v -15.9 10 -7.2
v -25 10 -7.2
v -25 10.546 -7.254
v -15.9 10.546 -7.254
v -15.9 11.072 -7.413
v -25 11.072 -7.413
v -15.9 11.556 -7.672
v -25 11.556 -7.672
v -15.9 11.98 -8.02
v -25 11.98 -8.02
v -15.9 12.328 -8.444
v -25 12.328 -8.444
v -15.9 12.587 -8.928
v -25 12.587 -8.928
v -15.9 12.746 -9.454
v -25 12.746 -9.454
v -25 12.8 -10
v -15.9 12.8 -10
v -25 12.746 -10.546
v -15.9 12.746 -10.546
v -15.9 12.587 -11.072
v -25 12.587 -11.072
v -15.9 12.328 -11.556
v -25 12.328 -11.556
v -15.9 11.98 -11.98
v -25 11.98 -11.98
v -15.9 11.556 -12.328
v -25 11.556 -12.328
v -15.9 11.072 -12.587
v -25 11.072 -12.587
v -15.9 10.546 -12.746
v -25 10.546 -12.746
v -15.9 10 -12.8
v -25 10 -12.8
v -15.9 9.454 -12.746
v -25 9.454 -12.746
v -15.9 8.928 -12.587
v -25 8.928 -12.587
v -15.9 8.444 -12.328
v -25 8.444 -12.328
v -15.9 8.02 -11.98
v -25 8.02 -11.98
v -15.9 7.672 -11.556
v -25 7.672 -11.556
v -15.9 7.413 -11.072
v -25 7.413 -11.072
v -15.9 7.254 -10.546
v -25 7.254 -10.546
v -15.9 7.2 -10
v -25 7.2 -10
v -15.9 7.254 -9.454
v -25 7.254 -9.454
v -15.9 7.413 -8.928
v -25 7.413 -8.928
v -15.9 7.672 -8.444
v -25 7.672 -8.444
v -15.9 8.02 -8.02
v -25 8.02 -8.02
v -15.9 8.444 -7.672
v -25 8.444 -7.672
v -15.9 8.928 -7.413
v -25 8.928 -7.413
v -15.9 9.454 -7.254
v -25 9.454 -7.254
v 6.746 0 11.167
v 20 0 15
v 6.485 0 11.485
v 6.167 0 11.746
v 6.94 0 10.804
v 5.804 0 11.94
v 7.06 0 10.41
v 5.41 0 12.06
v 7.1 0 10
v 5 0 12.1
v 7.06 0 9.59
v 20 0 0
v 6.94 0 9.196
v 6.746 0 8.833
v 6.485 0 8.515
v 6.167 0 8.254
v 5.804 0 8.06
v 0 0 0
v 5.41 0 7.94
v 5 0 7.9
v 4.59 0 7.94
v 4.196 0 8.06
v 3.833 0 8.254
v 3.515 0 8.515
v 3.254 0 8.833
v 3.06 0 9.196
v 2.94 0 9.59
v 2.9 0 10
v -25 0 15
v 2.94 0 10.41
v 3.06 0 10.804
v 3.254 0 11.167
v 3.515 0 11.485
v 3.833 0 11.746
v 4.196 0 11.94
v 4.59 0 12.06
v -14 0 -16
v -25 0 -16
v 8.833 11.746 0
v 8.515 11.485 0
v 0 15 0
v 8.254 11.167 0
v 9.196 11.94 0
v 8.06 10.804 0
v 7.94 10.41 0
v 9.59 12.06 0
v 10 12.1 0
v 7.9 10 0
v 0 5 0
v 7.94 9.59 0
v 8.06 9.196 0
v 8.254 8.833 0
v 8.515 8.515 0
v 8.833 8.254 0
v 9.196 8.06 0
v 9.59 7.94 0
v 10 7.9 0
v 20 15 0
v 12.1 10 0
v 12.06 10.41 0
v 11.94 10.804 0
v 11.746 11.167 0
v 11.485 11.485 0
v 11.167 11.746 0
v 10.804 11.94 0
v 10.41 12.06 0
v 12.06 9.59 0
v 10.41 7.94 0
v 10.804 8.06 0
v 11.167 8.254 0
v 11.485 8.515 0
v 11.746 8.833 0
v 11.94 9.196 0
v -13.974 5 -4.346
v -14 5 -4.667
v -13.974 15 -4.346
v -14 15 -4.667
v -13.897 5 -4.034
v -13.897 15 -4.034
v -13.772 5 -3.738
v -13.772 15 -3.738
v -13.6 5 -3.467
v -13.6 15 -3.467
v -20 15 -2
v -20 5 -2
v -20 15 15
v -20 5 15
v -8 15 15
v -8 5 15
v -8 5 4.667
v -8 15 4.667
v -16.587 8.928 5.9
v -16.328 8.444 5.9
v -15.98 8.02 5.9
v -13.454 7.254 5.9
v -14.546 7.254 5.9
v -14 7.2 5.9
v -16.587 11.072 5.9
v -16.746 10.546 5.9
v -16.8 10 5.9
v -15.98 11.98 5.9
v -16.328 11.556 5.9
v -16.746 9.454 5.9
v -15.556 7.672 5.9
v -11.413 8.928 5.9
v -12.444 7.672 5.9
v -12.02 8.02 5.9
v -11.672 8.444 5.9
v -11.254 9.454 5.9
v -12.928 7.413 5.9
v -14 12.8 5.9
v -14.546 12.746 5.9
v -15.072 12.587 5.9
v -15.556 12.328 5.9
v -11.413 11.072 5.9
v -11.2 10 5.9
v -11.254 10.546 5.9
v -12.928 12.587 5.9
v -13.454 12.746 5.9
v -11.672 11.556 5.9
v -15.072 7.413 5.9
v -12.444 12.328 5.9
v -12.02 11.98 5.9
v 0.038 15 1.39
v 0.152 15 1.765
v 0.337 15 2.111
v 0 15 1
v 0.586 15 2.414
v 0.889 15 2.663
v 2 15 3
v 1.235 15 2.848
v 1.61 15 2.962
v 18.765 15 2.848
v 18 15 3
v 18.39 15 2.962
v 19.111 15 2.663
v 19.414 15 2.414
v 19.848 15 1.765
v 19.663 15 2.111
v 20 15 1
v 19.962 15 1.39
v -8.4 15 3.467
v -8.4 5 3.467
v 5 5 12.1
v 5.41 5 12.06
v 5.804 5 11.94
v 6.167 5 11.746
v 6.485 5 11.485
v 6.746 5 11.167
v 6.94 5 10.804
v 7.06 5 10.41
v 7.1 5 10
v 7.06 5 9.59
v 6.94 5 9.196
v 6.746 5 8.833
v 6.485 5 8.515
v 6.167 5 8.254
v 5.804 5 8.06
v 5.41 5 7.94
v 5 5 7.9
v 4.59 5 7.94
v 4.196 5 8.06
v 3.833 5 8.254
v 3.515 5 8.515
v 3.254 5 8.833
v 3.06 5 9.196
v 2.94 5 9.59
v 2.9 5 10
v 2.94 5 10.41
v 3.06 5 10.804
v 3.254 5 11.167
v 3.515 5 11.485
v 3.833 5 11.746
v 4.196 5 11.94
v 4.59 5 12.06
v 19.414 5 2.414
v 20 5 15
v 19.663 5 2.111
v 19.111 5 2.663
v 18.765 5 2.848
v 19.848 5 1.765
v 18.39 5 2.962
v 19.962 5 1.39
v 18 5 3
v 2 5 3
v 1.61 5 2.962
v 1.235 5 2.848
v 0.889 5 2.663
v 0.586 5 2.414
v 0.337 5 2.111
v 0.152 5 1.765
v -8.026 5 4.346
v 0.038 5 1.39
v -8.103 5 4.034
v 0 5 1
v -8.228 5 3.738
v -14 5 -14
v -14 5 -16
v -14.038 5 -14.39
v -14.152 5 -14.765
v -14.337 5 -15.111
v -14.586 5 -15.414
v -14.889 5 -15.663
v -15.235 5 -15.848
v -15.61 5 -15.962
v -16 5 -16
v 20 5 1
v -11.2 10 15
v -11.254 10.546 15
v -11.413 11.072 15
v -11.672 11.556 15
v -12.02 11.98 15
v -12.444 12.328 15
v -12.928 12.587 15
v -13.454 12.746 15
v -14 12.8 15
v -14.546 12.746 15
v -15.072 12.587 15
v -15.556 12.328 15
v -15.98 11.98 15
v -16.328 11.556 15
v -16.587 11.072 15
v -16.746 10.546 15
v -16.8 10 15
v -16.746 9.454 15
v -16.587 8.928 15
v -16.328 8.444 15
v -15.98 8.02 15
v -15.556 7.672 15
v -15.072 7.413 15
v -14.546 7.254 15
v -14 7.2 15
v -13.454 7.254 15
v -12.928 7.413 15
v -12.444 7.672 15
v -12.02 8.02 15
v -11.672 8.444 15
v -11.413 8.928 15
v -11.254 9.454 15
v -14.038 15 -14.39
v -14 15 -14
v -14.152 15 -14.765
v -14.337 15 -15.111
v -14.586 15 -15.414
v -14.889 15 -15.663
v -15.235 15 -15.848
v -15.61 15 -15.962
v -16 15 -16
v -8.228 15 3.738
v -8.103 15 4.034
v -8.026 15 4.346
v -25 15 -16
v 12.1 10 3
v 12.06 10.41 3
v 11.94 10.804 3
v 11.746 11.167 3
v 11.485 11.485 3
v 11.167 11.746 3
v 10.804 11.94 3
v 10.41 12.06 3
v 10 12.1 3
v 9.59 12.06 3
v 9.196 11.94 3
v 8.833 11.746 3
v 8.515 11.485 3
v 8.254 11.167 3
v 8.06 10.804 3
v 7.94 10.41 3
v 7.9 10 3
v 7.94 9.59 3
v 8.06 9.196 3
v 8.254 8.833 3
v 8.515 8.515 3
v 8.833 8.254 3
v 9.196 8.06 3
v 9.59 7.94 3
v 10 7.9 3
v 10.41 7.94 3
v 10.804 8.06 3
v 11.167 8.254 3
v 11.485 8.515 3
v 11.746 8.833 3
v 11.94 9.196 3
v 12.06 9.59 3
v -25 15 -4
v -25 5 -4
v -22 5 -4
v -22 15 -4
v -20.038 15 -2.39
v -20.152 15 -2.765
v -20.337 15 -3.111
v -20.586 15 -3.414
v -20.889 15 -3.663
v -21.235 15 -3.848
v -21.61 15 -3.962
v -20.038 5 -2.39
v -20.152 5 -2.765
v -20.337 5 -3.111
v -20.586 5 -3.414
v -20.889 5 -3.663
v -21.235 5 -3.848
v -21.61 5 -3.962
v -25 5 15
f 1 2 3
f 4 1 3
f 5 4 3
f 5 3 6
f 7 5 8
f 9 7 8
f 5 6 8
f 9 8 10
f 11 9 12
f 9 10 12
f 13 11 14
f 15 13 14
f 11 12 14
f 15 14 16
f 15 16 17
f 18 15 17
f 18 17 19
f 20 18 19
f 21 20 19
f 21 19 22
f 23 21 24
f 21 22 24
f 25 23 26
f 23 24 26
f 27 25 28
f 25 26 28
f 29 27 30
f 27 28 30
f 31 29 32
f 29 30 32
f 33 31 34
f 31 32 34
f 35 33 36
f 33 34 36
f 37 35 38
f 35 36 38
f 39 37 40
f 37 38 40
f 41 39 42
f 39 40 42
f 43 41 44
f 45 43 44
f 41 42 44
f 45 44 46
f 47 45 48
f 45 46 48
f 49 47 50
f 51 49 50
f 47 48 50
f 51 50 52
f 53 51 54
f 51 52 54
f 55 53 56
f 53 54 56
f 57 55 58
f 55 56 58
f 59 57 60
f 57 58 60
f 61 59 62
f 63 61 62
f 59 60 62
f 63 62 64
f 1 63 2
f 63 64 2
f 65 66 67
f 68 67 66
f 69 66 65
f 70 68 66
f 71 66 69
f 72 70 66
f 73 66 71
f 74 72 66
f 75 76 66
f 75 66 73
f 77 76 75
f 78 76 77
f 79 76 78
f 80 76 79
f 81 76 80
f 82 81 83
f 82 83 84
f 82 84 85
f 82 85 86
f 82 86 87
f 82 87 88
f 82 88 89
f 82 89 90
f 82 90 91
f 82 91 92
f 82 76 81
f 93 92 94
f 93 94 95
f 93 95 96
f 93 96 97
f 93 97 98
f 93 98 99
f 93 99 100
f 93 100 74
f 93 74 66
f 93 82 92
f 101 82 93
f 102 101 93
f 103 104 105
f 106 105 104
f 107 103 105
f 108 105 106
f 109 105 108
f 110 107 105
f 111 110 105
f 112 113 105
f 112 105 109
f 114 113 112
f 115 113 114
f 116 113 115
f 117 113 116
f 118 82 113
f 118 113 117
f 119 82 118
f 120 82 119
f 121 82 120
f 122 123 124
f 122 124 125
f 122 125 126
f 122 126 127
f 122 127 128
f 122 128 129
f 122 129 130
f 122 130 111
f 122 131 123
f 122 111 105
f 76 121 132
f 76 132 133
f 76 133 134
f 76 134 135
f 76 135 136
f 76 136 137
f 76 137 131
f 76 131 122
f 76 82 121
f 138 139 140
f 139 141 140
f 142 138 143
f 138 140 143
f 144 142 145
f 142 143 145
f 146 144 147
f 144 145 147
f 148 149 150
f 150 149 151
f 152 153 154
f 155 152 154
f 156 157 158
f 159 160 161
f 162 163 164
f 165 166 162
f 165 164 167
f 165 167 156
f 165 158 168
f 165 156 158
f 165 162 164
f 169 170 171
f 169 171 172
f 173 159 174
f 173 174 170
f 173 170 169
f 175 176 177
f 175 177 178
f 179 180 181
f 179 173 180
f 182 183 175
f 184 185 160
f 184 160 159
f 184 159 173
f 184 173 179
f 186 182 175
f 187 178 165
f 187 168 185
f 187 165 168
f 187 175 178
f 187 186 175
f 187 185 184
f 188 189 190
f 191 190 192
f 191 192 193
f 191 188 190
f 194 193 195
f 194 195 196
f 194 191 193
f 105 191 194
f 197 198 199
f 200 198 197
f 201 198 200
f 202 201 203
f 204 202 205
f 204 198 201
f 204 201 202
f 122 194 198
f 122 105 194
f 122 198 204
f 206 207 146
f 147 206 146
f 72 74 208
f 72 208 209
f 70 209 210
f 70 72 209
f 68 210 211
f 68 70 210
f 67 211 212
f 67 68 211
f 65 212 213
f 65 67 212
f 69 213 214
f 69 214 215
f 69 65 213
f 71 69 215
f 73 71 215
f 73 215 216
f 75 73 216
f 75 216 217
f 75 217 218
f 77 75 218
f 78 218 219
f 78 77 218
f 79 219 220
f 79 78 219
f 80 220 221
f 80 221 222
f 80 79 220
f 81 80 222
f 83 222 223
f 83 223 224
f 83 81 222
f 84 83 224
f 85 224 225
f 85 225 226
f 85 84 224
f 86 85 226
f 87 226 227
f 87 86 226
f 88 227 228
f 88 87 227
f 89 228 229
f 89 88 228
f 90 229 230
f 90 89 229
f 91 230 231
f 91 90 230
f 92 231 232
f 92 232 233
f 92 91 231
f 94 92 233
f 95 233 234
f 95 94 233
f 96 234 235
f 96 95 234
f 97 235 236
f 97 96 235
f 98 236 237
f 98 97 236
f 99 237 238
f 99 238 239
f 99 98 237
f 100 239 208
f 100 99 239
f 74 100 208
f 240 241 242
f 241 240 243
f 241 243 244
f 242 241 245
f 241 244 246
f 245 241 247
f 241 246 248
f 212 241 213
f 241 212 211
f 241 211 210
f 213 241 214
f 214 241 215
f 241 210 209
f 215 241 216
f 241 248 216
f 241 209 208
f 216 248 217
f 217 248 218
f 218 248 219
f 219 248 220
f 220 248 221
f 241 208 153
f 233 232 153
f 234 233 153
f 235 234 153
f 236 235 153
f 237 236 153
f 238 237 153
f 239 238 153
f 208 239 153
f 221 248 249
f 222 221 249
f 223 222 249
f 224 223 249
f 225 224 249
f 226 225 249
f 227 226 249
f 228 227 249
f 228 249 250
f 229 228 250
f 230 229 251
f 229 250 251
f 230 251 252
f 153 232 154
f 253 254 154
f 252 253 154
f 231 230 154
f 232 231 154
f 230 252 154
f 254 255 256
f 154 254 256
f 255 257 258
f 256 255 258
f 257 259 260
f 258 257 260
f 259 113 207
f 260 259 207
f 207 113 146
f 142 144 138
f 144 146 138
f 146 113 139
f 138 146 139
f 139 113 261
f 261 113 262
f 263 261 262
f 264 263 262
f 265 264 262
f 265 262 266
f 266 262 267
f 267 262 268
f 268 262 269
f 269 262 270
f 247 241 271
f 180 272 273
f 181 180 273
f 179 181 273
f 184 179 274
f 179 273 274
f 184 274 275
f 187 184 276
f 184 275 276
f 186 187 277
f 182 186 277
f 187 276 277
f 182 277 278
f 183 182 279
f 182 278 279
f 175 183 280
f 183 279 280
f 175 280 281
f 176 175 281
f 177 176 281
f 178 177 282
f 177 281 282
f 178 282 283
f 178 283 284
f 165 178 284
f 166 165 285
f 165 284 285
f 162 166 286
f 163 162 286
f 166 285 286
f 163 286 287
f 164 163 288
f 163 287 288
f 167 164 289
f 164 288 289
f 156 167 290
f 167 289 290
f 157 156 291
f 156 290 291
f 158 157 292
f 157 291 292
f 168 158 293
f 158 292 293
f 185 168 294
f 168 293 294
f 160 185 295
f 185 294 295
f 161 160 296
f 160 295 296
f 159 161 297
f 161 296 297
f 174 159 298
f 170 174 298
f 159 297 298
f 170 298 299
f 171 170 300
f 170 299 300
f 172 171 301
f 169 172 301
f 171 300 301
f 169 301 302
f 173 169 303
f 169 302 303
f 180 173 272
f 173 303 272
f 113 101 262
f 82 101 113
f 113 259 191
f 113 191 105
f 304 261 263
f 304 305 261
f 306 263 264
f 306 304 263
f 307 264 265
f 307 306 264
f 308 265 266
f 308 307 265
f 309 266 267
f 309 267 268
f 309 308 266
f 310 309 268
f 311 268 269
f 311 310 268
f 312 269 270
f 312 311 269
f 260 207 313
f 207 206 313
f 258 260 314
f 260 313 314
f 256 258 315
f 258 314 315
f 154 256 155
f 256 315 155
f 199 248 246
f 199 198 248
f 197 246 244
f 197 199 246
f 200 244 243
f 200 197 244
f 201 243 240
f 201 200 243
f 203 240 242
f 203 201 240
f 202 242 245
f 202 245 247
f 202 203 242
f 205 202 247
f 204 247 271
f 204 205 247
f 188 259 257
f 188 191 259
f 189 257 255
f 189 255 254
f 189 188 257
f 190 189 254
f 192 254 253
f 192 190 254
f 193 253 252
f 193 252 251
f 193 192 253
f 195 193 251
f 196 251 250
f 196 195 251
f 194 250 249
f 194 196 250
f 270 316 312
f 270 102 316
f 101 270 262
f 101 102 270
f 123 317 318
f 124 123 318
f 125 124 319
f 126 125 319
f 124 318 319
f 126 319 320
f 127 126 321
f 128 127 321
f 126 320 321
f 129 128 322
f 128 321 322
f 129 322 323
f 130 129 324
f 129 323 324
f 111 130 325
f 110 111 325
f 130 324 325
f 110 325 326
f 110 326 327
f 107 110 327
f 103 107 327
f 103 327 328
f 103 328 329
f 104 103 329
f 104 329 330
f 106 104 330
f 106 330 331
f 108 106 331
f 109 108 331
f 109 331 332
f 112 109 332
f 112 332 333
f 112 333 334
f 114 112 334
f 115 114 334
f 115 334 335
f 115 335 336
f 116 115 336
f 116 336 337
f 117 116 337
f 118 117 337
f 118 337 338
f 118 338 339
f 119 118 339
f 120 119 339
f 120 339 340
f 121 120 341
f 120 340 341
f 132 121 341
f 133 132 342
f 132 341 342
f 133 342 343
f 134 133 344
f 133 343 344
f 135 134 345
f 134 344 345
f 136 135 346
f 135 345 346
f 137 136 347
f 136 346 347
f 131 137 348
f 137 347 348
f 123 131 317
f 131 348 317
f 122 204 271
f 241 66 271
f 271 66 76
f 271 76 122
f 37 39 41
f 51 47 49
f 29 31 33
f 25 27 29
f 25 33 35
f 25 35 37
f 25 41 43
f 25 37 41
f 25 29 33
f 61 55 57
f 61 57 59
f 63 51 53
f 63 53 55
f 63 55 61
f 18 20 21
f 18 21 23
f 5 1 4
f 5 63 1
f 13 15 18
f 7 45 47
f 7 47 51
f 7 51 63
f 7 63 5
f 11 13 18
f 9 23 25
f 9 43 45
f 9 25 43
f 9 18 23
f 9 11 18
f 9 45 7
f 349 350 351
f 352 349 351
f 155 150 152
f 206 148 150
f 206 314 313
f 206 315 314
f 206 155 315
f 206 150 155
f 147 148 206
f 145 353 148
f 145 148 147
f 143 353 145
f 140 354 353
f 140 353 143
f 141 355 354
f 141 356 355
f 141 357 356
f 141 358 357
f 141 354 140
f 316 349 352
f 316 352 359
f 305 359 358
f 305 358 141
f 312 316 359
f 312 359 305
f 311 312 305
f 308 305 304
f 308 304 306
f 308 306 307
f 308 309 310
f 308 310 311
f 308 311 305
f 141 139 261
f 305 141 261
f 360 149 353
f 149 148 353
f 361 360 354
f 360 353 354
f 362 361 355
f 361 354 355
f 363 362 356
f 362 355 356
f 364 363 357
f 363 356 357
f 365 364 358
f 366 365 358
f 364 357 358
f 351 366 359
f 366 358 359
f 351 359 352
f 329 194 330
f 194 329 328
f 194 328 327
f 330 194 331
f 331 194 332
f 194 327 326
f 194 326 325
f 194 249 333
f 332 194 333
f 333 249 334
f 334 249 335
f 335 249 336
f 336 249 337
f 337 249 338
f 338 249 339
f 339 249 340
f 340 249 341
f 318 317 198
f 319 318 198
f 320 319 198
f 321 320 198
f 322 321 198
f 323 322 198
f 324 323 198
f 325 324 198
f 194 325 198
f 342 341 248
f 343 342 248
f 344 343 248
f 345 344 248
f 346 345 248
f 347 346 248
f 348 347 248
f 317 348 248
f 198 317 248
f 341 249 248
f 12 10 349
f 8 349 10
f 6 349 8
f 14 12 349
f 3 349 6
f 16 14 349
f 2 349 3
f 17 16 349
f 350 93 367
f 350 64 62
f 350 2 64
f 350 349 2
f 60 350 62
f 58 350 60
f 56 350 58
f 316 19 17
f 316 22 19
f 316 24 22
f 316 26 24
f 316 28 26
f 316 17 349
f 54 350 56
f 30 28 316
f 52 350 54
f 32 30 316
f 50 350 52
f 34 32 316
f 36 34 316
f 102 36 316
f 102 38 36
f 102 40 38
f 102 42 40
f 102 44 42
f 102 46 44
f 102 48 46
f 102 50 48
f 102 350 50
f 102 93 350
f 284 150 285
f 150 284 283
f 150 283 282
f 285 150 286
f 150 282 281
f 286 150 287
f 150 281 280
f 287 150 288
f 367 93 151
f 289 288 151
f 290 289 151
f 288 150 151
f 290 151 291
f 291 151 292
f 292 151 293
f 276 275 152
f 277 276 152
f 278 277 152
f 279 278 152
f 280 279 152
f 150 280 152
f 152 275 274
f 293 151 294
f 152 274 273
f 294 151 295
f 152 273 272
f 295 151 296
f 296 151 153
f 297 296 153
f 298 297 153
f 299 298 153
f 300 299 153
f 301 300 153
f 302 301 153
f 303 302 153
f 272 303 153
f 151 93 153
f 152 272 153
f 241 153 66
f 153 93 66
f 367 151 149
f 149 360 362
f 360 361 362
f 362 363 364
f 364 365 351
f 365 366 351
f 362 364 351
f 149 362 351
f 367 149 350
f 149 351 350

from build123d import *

# Parameters (mm, degrees)
ESQUISSE1_R             = 2.1
BOSS_EXTRU_1_DEPTH      = 5
ESQUISSE2_W             = 20
ESQUISSE2_H             = 3
BOSS_EXTRU_2_DEPTH      = 10
ESQUISSE3_R             = 2.8
ENL_V_MAT_EXTRU_1_DEPTH = 9.1
ESQUISSE4_R             = 2.1
ENL_V_MAT_EXTRU_2_DEPTH = 9.1
CONG_2_R                = 2
ESQUISSE5_R             = 2.8
ENL_V_MAT_EXTRU_3_DEPTH = 9.1


with BuildPart() as part:
    # Esquisse1 → Boss.-Extru.1 (new body)
    with BuildSketch(Plane(origin=(0, 0, 0), x_dir=(1, 0, 0), z_dir=(0, 1, 0))):
        Polygon((20, 0), (20, -15), (-20, -15), (-25, -15), (-25, 16), (-14, 16), (0, 0), align=None)
        with Locations(Location((5, -10, 0), (0, 0, 270))):
            Circle(ESQUISSE1_R, mode=Mode.SUBTRACT)
    extrude(amount=BOSS_EXTRU_1_DEPTH)

    # Esquisse2 → Boss.-Extru.2 (add)
    with BuildSketch(Plane(origin=(0, 5, 0), x_dir=(1, 0, 0), z_dir=(0, 1, 0))):
        with Locations((10, -1.5)):
            Rectangle(ESQUISSE2_W, ESQUISSE2_H)
        Polygon((-14, 4), (-14, 16), (-25, 16), (-25, 4), (-20, 4), (-20, -15), (-8, -15), (-8, -4), align=None)
    extrude(amount=BOSS_EXTRU_2_DEPTH)

    # Esquisse3 → Enlèv. mat.-Extru.1 (cut)
    with BuildSketch(Plane.XY.offset(15)):
        with Locations((-14, 10)):
            Circle(ESQUISSE3_R)
    extrude(amount=-ENL_V_MAT_EXTRU_1_DEPTH, mode=Mode.SUBTRACT)

    # Esquisse4 → Enlèv. mat.-Extru.2 (cut)
    with BuildSketch(Plane.XY.offset(3)):
        with Locations((10, 10)):
            Circle(ESQUISSE4_R)
    extrude(amount=-ENL_V_MAT_EXTRU_2_DEPTH, mode=Mode.SUBTRACT)

    # Congé2
    cong_2_edges = [part.edges().sort_by_distance(p)[0] for p in [
        (0, 10, 3),
        (20, 10, 3),
        (-20, 10, -4),
        (-8, 10, 4),
        (-14, 10, -4),
        (-14, 10, -16),
    ]]
    fillet(cong_2_edges, radius=CONG_2_R)

    # Esquisse5 → Enlèv. mat.-Extru.3 (cut)
    with BuildSketch(Plane.ZY.offset(25)):
        with Locations((-10, 10)):
            Circle(ESQUISSE5_R)
    extrude(amount=-ENL_V_MAT_EXTRU_3_DEPTH, mode=Mode.SUBTRACT)


solid = part.part
